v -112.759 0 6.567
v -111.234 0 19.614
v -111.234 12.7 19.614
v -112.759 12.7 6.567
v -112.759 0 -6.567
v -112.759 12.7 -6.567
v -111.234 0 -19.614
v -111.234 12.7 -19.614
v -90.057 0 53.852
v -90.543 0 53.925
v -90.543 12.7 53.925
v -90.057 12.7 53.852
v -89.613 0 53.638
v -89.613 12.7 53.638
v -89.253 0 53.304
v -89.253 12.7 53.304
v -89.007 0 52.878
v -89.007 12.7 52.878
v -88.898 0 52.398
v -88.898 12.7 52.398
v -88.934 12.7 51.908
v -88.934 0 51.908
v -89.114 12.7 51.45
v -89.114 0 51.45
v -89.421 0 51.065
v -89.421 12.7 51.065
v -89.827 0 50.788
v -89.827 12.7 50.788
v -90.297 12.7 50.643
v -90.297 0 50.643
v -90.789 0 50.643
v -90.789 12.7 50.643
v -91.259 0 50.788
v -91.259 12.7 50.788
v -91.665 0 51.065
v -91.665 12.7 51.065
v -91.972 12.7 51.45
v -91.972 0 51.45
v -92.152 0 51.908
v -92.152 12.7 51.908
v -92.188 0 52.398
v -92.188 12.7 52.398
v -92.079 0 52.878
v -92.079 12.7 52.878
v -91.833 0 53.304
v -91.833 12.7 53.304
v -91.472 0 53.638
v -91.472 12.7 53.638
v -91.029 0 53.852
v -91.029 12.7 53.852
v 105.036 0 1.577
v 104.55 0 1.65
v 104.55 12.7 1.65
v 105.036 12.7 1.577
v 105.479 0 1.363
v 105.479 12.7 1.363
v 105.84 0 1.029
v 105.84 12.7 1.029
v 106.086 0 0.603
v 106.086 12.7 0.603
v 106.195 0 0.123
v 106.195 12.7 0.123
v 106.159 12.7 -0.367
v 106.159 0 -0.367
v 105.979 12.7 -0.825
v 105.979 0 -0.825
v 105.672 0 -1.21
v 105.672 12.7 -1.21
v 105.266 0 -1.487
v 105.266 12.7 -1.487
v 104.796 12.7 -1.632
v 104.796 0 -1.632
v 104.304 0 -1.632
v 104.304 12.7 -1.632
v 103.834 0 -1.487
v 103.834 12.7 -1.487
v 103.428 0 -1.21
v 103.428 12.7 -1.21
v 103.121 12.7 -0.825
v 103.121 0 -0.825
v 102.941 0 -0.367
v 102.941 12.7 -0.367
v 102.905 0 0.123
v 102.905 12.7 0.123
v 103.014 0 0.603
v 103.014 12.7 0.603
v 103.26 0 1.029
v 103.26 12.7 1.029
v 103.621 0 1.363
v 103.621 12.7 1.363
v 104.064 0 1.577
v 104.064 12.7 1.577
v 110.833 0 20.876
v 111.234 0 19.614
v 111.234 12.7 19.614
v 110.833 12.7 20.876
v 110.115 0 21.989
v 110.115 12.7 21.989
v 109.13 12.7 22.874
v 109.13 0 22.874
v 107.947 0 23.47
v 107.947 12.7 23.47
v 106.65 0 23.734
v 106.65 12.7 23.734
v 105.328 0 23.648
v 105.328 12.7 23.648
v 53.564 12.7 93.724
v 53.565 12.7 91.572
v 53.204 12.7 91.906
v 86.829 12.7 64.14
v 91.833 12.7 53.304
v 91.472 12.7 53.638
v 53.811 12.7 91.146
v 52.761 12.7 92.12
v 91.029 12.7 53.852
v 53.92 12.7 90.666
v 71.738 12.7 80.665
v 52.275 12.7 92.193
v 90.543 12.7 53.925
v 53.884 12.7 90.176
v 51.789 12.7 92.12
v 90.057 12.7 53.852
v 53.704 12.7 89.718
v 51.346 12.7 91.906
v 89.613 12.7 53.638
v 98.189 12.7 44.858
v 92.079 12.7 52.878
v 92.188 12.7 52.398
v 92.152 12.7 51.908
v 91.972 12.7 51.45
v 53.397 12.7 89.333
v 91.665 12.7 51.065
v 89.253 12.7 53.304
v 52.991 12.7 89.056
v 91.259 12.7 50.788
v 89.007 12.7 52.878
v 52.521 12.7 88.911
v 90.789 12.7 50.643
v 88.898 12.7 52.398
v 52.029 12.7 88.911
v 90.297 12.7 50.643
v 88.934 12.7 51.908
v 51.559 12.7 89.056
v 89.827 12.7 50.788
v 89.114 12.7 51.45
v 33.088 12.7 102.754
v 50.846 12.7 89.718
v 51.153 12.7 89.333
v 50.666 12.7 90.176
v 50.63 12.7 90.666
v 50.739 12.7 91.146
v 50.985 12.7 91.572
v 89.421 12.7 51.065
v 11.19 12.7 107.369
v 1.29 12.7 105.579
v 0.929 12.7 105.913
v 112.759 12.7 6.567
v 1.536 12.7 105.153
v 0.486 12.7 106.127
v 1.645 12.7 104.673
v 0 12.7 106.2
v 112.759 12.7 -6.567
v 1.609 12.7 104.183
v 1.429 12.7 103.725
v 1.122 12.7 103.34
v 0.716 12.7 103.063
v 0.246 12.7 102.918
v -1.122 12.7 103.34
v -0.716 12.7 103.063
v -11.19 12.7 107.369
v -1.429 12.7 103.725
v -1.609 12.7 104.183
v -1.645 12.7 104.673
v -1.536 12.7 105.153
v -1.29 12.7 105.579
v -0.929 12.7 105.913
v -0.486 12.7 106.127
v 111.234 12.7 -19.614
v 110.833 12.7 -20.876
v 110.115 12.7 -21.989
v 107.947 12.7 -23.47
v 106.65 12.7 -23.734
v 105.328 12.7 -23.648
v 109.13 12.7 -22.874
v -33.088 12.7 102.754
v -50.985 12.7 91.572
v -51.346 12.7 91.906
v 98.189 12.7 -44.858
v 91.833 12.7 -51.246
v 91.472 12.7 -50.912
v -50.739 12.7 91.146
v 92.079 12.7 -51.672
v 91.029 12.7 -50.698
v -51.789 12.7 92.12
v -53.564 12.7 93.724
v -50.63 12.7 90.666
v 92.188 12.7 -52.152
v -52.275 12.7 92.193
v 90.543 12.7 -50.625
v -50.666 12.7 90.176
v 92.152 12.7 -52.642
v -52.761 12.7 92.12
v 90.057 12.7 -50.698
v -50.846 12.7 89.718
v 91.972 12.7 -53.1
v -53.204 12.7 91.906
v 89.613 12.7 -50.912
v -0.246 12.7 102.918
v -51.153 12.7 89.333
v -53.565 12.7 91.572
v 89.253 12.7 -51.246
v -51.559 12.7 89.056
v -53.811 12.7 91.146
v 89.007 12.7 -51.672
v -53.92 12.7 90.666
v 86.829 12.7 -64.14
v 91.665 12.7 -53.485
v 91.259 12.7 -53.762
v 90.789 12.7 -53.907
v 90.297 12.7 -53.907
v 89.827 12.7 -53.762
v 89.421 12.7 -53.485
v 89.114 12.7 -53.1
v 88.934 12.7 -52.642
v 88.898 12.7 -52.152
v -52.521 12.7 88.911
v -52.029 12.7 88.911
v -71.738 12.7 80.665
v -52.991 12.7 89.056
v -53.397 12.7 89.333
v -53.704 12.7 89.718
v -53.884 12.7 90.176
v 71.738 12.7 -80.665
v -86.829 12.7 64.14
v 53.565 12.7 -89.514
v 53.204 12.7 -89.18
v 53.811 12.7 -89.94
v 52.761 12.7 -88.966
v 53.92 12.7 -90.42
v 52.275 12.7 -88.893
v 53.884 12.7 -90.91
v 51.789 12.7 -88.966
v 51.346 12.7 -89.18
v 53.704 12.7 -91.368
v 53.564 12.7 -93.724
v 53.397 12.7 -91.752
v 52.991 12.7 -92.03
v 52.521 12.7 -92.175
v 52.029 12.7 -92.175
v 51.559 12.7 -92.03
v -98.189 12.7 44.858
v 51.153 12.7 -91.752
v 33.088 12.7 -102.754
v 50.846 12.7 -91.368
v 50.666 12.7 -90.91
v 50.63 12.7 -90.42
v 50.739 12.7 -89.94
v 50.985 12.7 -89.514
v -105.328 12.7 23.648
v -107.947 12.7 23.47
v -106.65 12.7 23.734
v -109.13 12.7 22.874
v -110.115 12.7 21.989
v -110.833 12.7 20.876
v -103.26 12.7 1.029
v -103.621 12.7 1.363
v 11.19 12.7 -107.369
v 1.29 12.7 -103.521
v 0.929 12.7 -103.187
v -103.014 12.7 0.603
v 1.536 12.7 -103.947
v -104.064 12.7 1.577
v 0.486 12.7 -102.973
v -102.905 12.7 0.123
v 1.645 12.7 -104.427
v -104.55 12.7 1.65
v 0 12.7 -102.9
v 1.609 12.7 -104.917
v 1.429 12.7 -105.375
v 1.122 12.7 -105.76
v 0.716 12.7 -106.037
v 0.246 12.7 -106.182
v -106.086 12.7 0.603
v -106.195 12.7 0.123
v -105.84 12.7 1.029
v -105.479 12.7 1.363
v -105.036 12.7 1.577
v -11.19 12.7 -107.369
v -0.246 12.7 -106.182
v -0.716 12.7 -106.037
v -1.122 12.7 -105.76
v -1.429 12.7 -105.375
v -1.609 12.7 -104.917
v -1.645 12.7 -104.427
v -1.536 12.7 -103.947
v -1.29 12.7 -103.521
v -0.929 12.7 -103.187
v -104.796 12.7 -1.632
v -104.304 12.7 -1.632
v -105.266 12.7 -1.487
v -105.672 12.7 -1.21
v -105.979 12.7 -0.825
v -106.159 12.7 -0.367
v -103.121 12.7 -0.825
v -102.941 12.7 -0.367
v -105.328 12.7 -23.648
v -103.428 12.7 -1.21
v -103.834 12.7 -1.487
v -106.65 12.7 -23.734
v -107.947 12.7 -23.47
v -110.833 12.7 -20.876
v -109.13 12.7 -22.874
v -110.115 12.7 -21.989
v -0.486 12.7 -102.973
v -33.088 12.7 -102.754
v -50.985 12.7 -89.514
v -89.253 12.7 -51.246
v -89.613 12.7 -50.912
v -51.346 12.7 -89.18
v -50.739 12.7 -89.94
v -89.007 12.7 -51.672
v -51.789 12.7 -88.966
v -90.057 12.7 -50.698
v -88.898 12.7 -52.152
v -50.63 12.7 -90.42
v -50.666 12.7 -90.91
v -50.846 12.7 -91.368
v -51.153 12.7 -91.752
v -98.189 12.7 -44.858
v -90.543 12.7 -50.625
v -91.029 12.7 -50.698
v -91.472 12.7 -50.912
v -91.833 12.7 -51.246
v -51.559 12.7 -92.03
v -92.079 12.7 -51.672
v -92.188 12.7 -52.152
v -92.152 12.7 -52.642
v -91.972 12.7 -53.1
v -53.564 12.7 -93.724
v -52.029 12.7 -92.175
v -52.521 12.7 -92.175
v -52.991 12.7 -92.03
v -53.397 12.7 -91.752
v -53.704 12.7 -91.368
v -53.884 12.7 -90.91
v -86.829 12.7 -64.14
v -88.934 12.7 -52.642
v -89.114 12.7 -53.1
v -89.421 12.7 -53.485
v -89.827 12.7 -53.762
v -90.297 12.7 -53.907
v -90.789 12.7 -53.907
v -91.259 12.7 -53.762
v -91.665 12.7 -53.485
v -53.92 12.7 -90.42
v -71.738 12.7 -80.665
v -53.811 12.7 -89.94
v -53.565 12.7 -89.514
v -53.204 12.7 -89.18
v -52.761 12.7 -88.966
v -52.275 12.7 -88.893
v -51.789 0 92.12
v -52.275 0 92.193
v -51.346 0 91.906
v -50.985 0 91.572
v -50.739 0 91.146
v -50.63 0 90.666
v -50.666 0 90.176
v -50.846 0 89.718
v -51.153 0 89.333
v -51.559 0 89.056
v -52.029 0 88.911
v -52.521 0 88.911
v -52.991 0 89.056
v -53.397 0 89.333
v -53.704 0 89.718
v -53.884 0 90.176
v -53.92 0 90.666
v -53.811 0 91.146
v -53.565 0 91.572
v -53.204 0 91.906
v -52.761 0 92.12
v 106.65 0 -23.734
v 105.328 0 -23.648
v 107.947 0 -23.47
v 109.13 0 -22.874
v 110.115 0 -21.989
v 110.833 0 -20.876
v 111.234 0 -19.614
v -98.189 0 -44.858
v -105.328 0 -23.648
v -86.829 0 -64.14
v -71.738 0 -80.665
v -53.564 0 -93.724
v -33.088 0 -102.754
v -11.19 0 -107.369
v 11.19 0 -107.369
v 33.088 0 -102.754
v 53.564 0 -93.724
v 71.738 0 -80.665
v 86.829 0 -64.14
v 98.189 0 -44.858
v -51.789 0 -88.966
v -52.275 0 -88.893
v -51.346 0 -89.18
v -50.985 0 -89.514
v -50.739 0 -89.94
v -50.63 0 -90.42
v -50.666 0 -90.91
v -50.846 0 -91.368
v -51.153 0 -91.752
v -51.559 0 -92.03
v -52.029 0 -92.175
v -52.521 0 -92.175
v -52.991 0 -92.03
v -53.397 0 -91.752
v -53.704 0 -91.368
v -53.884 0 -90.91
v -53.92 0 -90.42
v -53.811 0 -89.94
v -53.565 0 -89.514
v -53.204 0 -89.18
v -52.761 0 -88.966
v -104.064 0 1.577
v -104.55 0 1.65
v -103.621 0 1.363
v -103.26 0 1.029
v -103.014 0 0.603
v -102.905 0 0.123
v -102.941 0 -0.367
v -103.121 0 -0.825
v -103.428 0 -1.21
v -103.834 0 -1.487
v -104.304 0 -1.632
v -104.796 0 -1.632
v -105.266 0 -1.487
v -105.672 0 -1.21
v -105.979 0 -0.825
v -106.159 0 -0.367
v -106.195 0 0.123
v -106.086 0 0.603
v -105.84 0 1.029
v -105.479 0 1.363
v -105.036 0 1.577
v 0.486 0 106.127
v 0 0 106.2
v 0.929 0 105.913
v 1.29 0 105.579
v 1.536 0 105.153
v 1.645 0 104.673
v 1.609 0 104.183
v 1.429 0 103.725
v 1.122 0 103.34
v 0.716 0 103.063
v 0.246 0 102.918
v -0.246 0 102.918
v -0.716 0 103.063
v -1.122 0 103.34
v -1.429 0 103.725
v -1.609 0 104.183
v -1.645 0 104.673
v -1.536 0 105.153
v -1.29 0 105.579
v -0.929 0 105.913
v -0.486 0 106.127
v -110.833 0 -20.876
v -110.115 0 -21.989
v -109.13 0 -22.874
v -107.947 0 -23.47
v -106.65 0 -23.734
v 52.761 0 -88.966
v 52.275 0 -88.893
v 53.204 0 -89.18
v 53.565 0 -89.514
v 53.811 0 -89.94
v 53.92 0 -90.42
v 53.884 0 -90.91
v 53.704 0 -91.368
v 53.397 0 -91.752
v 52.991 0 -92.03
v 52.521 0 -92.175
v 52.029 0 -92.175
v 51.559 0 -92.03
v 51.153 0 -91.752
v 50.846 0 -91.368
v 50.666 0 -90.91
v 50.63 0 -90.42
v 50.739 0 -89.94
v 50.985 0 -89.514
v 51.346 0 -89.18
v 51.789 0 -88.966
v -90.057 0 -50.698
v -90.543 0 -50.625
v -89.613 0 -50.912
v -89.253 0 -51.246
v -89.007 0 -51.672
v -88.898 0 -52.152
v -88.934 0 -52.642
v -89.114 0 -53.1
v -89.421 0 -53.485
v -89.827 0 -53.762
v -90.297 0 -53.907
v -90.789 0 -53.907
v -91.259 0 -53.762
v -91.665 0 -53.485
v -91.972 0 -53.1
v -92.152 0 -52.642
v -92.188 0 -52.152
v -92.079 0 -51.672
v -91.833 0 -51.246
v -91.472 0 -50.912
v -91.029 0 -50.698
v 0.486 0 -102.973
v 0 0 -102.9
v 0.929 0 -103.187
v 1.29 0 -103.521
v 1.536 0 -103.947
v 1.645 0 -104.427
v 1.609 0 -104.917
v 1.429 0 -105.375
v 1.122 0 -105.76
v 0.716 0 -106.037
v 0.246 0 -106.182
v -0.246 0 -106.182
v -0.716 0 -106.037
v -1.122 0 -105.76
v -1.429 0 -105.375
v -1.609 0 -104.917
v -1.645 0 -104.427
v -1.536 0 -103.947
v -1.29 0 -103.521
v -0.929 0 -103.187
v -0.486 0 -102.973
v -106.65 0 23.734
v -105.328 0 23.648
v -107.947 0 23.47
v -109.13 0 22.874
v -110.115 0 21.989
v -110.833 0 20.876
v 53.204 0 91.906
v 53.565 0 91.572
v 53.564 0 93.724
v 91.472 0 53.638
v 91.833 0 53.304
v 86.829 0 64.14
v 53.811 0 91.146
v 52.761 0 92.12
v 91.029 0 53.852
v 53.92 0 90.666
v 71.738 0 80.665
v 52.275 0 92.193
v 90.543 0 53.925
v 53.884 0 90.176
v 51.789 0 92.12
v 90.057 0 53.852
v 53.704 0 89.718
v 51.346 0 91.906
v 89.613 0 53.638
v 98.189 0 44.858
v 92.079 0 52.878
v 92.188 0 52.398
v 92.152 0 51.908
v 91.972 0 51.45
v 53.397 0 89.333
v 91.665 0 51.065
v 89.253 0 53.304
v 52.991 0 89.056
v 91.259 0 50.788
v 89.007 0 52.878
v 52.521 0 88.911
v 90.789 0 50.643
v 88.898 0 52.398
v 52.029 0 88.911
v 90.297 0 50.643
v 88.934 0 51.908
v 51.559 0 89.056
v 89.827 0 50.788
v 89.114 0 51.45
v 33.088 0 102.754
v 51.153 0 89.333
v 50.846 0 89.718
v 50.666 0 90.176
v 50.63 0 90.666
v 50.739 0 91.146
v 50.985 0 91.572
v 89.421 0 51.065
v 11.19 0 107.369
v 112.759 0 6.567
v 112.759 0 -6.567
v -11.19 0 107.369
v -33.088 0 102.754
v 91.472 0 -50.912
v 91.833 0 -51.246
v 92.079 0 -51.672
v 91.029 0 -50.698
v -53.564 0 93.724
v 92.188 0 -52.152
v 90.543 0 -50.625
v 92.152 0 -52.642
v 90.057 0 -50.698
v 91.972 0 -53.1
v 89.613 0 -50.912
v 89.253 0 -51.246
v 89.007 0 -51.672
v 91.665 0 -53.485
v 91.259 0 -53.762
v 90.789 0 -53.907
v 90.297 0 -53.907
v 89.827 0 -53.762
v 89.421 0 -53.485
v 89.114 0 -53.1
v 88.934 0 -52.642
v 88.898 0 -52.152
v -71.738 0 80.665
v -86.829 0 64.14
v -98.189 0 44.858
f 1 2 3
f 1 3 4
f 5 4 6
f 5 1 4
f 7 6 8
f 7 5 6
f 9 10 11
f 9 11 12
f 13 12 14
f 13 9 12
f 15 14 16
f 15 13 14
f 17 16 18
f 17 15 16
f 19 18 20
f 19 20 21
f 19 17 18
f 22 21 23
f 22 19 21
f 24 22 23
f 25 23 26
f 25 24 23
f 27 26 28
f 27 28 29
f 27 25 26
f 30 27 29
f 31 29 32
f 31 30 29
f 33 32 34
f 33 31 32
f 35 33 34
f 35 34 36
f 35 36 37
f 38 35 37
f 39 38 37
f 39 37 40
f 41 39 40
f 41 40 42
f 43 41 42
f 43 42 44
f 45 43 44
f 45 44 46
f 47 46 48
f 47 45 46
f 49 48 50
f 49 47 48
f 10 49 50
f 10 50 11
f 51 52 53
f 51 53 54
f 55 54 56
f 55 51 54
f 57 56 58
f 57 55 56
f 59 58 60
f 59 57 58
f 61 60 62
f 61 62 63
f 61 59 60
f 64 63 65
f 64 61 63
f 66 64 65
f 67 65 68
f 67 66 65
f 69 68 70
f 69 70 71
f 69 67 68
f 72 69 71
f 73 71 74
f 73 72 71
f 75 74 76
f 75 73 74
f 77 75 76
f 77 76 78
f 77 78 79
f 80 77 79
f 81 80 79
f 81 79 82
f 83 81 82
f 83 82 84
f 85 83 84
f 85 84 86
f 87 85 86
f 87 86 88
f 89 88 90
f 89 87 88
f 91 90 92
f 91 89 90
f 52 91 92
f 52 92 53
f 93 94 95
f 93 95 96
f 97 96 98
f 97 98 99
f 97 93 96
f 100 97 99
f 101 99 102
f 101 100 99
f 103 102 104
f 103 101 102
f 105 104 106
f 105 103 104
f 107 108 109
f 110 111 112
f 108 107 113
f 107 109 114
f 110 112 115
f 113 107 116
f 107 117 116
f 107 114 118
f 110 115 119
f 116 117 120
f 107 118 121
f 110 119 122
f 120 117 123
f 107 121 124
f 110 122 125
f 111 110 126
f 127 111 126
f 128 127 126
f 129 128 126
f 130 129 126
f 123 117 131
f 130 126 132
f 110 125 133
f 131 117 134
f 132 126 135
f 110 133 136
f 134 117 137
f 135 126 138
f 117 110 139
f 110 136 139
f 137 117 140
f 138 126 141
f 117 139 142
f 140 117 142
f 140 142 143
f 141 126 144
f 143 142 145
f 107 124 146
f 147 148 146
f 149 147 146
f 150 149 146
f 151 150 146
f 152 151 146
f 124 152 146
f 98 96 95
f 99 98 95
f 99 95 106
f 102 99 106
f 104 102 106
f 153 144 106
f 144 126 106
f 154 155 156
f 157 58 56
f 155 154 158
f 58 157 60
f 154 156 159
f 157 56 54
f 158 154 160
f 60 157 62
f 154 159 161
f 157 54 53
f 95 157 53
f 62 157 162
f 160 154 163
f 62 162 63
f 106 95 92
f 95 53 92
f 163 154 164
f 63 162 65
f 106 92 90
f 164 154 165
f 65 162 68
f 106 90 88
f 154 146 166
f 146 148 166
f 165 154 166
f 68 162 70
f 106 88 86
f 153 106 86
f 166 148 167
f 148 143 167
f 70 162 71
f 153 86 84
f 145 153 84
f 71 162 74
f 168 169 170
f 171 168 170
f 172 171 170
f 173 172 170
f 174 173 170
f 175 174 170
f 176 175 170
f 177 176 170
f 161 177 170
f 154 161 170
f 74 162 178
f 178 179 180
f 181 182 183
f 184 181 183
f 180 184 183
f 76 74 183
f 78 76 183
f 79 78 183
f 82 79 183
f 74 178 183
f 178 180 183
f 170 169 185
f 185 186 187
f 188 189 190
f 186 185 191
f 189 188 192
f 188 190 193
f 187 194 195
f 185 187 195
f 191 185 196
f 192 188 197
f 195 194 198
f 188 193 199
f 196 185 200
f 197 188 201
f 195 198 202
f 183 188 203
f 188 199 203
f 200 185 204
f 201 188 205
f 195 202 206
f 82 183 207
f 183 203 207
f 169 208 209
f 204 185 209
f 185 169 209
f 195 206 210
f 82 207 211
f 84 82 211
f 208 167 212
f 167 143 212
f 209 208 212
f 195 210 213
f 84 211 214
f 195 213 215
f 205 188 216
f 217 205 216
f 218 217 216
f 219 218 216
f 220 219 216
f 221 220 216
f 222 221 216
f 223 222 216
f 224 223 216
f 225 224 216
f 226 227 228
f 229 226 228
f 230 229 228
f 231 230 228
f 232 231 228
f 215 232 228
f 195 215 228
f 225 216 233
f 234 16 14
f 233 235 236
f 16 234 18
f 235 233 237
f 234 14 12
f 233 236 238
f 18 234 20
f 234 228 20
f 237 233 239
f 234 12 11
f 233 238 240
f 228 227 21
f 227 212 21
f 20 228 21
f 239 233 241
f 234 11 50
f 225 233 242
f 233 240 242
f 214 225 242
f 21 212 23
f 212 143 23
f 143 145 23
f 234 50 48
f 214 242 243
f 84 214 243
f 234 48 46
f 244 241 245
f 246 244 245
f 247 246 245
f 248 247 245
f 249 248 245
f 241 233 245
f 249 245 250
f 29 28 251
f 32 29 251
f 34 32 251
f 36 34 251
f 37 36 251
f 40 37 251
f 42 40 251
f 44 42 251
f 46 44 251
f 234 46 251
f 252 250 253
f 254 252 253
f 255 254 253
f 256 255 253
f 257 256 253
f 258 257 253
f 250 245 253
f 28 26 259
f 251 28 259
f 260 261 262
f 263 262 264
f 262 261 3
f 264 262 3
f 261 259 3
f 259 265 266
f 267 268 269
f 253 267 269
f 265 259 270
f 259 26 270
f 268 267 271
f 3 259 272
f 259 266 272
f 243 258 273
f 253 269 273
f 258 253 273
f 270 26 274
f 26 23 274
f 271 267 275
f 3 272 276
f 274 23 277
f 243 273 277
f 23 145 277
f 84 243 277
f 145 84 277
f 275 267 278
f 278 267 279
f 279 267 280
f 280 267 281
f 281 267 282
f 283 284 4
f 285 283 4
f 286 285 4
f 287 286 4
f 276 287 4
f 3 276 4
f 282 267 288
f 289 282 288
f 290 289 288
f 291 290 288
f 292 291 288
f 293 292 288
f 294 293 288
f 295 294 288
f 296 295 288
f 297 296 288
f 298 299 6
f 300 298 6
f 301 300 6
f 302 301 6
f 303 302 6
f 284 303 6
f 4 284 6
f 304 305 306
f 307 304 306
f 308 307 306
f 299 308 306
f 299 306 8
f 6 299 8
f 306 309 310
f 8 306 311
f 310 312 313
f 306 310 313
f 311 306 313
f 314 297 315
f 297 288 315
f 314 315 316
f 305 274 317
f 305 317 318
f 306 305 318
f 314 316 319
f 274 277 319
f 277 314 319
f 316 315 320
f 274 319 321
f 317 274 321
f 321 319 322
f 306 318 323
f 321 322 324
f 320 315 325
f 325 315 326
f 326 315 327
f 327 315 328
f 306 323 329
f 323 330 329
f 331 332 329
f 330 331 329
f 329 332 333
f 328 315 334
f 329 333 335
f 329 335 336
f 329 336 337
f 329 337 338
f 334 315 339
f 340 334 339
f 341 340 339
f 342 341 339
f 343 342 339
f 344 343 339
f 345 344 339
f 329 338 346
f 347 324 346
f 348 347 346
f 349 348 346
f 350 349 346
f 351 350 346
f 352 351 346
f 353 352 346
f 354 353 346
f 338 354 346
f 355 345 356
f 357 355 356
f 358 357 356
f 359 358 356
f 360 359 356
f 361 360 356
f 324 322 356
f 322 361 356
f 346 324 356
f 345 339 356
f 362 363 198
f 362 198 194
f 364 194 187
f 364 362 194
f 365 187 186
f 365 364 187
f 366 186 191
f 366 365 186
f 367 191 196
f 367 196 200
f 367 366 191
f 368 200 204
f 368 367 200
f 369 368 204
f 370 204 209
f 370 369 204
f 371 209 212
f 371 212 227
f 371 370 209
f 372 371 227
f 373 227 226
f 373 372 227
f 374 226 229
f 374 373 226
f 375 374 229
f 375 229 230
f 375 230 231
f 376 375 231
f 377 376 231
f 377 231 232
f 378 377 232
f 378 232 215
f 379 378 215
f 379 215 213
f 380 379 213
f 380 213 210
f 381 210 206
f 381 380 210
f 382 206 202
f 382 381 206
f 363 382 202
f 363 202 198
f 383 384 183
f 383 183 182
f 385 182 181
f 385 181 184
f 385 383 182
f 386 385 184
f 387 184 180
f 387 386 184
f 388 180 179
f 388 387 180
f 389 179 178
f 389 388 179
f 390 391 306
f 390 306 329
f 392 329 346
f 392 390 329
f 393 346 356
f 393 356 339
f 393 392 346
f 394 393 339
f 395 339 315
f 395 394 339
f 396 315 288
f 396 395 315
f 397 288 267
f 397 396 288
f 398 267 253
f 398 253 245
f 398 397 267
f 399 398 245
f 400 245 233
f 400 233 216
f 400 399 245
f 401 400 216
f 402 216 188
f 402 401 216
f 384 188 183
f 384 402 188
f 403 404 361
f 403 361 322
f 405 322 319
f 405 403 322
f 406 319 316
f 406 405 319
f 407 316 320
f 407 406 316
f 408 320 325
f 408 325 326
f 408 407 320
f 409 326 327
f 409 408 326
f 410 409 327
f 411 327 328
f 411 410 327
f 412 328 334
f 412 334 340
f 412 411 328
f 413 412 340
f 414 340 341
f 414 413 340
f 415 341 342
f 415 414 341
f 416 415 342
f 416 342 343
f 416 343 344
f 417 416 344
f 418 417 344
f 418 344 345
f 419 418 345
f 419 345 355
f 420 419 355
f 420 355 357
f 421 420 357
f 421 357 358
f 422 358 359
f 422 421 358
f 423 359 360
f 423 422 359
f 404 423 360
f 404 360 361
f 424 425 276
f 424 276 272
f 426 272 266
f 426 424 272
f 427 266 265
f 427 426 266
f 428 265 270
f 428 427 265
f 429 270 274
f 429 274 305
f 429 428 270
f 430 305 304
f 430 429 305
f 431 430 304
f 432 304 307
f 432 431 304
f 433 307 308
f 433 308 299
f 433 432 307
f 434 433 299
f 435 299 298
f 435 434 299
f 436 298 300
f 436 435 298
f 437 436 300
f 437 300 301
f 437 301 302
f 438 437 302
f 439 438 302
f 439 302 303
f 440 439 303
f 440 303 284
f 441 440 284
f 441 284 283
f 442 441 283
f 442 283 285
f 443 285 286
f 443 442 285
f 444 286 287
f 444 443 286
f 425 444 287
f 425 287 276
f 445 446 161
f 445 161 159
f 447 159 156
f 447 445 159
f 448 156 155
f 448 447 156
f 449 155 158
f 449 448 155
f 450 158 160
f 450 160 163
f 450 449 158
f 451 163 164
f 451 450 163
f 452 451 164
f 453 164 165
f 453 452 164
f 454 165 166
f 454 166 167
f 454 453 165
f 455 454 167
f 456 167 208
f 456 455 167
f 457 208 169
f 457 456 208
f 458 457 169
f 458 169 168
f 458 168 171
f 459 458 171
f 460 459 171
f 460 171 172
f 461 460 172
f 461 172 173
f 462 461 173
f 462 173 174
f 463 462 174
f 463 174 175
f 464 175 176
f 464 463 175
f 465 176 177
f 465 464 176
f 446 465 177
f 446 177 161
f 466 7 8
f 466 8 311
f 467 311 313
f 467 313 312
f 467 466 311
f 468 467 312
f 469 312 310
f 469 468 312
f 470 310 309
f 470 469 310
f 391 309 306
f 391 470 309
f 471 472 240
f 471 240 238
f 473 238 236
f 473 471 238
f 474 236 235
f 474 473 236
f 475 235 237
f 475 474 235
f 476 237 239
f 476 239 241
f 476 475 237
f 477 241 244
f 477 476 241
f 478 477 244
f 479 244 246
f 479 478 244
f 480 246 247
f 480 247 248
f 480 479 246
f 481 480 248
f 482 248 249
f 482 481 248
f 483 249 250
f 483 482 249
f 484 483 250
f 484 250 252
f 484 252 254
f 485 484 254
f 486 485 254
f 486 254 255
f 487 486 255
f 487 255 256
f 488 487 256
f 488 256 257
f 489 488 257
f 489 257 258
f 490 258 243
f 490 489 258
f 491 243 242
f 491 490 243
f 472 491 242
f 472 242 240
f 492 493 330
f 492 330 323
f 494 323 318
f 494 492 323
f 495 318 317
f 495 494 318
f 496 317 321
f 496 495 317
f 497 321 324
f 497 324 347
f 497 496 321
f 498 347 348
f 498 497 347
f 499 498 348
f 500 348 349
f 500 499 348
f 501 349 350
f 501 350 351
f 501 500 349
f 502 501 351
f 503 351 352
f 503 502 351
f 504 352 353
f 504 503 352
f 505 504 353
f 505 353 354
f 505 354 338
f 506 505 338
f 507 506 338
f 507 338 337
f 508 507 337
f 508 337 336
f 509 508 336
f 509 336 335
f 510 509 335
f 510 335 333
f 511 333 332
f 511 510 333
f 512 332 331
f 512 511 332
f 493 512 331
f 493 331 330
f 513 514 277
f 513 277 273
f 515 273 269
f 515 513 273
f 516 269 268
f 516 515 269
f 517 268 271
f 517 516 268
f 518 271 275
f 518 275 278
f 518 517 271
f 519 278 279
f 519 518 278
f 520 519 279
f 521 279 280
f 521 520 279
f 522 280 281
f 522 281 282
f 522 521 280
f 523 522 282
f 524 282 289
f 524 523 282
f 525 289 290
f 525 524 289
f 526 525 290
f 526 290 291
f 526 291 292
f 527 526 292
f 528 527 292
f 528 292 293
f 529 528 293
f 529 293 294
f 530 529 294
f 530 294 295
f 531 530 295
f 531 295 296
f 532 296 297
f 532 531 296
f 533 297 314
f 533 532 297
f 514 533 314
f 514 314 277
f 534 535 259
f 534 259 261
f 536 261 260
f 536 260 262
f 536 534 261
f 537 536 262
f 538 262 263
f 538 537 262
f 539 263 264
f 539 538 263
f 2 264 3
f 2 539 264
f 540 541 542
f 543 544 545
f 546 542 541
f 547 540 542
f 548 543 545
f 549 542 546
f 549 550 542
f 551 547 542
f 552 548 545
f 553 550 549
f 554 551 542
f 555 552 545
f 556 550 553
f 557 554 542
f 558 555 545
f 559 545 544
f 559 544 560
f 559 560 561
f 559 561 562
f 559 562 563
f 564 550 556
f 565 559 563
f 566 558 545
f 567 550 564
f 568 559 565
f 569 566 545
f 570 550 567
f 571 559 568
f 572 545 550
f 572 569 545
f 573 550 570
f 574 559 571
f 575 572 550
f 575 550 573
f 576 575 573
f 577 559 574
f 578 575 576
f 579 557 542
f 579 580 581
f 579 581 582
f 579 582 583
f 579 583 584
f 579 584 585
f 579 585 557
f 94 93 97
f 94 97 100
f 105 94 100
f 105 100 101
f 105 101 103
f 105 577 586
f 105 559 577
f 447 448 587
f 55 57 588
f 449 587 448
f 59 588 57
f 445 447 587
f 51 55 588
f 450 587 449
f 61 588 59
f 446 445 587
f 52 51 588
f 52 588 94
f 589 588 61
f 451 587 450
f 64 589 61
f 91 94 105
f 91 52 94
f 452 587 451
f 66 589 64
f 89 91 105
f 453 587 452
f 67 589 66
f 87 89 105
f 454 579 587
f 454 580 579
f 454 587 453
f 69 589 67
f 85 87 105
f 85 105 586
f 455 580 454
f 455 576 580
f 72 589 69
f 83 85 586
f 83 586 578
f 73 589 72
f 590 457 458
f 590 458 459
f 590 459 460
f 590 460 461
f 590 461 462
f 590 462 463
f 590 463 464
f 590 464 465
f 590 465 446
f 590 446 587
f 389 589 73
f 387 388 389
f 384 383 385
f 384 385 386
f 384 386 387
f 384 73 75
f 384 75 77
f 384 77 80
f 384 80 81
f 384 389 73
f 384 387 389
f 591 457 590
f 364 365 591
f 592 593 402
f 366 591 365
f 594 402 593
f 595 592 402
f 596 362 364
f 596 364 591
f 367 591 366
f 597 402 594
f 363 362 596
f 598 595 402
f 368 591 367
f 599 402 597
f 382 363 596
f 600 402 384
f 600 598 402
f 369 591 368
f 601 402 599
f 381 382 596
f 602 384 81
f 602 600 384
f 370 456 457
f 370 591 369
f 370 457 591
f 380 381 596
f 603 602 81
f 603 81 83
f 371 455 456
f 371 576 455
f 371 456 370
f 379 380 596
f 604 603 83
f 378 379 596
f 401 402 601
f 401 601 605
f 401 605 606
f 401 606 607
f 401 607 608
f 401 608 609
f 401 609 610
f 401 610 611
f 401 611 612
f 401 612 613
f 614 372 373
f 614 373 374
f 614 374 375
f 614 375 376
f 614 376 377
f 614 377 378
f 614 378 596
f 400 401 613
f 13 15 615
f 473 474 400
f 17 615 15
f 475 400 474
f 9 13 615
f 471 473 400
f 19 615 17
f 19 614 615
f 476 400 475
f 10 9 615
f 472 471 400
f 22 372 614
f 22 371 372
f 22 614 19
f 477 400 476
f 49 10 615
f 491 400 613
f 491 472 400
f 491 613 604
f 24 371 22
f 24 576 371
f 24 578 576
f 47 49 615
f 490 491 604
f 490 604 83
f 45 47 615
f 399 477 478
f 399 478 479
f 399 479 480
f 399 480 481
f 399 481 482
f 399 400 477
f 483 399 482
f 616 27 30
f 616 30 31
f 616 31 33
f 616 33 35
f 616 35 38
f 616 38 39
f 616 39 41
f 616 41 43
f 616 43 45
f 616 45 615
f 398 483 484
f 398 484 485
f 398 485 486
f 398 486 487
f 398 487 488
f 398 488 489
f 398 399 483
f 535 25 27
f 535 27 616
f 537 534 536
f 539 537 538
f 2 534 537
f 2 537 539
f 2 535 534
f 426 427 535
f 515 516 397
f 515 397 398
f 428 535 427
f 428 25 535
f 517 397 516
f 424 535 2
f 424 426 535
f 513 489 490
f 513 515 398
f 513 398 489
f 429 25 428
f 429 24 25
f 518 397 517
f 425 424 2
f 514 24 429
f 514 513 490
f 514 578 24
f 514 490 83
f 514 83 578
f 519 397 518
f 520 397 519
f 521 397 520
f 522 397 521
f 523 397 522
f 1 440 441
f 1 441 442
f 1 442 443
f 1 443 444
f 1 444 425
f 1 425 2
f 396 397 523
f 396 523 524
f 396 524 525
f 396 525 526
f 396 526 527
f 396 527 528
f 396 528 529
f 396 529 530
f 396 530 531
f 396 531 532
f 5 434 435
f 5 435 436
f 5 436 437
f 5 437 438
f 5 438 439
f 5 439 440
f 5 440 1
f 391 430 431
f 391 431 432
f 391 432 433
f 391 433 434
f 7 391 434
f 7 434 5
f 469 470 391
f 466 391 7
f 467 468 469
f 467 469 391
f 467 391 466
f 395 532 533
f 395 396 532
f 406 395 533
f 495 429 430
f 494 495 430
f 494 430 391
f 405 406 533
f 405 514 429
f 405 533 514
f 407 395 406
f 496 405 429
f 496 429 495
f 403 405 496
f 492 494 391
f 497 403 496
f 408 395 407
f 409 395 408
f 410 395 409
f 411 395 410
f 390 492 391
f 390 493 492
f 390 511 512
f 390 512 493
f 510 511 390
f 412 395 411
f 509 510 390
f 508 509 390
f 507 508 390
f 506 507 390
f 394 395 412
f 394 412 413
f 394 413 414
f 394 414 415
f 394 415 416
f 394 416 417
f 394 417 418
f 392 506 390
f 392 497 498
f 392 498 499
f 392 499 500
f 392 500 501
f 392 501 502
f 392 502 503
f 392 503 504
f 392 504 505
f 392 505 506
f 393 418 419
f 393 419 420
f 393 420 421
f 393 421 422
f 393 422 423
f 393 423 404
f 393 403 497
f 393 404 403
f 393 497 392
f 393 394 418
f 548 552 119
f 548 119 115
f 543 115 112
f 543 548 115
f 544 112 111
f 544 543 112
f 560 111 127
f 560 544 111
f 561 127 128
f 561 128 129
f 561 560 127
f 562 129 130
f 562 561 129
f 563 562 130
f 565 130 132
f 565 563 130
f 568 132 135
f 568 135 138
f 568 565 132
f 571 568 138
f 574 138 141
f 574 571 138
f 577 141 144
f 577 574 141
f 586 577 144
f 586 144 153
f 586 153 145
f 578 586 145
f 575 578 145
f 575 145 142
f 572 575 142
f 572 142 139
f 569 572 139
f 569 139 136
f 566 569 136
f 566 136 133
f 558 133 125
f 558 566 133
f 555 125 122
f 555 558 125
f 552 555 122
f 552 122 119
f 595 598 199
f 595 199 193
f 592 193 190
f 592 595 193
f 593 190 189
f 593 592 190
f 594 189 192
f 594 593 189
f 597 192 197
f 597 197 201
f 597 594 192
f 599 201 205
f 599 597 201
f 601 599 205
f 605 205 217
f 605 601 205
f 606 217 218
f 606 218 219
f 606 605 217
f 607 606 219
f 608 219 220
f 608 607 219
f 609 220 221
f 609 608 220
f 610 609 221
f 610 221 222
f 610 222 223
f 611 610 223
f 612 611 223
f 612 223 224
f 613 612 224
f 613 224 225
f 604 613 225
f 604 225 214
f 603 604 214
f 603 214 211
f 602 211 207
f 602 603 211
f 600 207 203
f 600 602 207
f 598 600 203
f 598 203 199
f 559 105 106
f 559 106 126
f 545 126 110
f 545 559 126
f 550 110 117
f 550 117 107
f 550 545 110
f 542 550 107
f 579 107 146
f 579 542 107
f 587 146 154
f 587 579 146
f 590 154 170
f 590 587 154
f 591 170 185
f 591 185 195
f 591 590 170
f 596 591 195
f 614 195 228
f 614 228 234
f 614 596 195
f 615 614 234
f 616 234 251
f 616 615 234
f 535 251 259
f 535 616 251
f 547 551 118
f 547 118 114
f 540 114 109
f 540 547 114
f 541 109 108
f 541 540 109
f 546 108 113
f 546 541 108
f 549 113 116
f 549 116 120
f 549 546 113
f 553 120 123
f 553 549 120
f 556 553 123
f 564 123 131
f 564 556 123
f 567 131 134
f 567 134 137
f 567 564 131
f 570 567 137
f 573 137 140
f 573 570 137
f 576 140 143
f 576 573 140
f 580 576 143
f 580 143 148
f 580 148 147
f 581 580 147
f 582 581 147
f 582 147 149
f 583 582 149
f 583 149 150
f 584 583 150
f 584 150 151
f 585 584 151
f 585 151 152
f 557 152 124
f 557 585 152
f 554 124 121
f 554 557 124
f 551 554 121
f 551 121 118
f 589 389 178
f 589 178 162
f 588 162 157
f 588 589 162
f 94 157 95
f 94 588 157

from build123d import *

# Parameters (mm, degrees)
SKETCH1_R           = 1.65
BOSS_EXTRUDE1_DEPTH = 12.7


with BuildPart() as part:
    # Sketch1 → Boss-Extrude1 (new body)
    with BuildSketch(Plane(origin=(0, 0, 0), x_dir=(1, 0, 0), z_dir=(0, 1, 0))):
        with BuildLine():
            ThreePointArc((-111.234035703, -19.613561667), (-112.95, 0), (-111.234035703, 19.613561667))
            ThreePointArc((-111.234035703, 19.613561667), (-109.13025705, 22.87401705), (-105.327953741, 23.647931427))
            ThreePointArc((-105.327953741, 23.647931427), (0, 107.95), (105.327953741, 23.647931427))
            ThreePointArc((105.327953741, 23.647931427), (109.13025705, 22.87401705), (111.234035703, 19.613561667))
            ThreePointArc((111.234035703, 19.613561667), (112.95, 0), (111.234035703, -19.613561667))
            ThreePointArc((111.234035703, -19.613561667), (109.13025705, -22.87401705), (105.327953741, -23.647931427))
            ThreePointArc((105.327953741, -23.647931427), (0, -107.95), (-105.327953741, -23.647931427))
            ThreePointArc((-105.327953741, -23.647931427), (-109.13025705, -22.87401705), (-111.234035703, -19.613561667))
        make_face()
        with Locations(Location((0, 104.55, 0), (0, 0, 270))):
            Circle(SKETCH1_R, mode=Mode.SUBTRACT)
        with Locations(Location((52.275, 90.542955966, 0), (0, 0, 270))):
            Circle(SKETCH1_R, mode=Mode.SUBTRACT)
        with Locations(Location((90.542955966, 52.275, 0), (0, 0, 270))):
            Circle(SKETCH1_R, mode=Mode.SUBTRACT)
        with Locations(Location((104.55, 0, 0), (0, 0, 270))):
            Circle(SKETCH1_R, mode=Mode.SUBTRACT)
        with Locations(Location((90.542955966, -52.275, 0), (0, 0, 270))):
            Circle(SKETCH1_R, mode=Mode.SUBTRACT)
        with Locations(Location((52.275, -90.542955966, 0), (0, 0, 270))):
            Circle(SKETCH1_R, mode=Mode.SUBTRACT)
        with Locations(Location((0, -104.55, 0), (0, 0, 270))):
            Circle(SKETCH1_R, mode=Mode.SUBTRACT)
        with Locations(Location((-52.275, -90.542955966, 0), (0, 0, 270))):
            Circle(SKETCH1_R, mode=Mode.SUBTRACT)
        with Locations(Location((-90.542955966, -52.275, 0), (0, 0, 270))):
            Circle(SKETCH1_R, mode=Mode.SUBTRACT)
        with Locations(Location((-104.55, 0, 0), (0, 0, 270))):
            Circle(SKETCH1_R, mode=Mode.SUBTRACT)
        with Locations(Location((-90.542955966, 52.275, 0), (0, 0, 270))):
            Circle(SKETCH1_R, mode=Mode.SUBTRACT)
        with Locations(Location((-52.275, 90.542955966, 0), (0, 0, 270))):
            Circle(SKETCH1_R, mode=Mode.SUBTRACT)
    extrude(amount=BOSS_EXTRUDE1_DEPTH)


solid = part.part
